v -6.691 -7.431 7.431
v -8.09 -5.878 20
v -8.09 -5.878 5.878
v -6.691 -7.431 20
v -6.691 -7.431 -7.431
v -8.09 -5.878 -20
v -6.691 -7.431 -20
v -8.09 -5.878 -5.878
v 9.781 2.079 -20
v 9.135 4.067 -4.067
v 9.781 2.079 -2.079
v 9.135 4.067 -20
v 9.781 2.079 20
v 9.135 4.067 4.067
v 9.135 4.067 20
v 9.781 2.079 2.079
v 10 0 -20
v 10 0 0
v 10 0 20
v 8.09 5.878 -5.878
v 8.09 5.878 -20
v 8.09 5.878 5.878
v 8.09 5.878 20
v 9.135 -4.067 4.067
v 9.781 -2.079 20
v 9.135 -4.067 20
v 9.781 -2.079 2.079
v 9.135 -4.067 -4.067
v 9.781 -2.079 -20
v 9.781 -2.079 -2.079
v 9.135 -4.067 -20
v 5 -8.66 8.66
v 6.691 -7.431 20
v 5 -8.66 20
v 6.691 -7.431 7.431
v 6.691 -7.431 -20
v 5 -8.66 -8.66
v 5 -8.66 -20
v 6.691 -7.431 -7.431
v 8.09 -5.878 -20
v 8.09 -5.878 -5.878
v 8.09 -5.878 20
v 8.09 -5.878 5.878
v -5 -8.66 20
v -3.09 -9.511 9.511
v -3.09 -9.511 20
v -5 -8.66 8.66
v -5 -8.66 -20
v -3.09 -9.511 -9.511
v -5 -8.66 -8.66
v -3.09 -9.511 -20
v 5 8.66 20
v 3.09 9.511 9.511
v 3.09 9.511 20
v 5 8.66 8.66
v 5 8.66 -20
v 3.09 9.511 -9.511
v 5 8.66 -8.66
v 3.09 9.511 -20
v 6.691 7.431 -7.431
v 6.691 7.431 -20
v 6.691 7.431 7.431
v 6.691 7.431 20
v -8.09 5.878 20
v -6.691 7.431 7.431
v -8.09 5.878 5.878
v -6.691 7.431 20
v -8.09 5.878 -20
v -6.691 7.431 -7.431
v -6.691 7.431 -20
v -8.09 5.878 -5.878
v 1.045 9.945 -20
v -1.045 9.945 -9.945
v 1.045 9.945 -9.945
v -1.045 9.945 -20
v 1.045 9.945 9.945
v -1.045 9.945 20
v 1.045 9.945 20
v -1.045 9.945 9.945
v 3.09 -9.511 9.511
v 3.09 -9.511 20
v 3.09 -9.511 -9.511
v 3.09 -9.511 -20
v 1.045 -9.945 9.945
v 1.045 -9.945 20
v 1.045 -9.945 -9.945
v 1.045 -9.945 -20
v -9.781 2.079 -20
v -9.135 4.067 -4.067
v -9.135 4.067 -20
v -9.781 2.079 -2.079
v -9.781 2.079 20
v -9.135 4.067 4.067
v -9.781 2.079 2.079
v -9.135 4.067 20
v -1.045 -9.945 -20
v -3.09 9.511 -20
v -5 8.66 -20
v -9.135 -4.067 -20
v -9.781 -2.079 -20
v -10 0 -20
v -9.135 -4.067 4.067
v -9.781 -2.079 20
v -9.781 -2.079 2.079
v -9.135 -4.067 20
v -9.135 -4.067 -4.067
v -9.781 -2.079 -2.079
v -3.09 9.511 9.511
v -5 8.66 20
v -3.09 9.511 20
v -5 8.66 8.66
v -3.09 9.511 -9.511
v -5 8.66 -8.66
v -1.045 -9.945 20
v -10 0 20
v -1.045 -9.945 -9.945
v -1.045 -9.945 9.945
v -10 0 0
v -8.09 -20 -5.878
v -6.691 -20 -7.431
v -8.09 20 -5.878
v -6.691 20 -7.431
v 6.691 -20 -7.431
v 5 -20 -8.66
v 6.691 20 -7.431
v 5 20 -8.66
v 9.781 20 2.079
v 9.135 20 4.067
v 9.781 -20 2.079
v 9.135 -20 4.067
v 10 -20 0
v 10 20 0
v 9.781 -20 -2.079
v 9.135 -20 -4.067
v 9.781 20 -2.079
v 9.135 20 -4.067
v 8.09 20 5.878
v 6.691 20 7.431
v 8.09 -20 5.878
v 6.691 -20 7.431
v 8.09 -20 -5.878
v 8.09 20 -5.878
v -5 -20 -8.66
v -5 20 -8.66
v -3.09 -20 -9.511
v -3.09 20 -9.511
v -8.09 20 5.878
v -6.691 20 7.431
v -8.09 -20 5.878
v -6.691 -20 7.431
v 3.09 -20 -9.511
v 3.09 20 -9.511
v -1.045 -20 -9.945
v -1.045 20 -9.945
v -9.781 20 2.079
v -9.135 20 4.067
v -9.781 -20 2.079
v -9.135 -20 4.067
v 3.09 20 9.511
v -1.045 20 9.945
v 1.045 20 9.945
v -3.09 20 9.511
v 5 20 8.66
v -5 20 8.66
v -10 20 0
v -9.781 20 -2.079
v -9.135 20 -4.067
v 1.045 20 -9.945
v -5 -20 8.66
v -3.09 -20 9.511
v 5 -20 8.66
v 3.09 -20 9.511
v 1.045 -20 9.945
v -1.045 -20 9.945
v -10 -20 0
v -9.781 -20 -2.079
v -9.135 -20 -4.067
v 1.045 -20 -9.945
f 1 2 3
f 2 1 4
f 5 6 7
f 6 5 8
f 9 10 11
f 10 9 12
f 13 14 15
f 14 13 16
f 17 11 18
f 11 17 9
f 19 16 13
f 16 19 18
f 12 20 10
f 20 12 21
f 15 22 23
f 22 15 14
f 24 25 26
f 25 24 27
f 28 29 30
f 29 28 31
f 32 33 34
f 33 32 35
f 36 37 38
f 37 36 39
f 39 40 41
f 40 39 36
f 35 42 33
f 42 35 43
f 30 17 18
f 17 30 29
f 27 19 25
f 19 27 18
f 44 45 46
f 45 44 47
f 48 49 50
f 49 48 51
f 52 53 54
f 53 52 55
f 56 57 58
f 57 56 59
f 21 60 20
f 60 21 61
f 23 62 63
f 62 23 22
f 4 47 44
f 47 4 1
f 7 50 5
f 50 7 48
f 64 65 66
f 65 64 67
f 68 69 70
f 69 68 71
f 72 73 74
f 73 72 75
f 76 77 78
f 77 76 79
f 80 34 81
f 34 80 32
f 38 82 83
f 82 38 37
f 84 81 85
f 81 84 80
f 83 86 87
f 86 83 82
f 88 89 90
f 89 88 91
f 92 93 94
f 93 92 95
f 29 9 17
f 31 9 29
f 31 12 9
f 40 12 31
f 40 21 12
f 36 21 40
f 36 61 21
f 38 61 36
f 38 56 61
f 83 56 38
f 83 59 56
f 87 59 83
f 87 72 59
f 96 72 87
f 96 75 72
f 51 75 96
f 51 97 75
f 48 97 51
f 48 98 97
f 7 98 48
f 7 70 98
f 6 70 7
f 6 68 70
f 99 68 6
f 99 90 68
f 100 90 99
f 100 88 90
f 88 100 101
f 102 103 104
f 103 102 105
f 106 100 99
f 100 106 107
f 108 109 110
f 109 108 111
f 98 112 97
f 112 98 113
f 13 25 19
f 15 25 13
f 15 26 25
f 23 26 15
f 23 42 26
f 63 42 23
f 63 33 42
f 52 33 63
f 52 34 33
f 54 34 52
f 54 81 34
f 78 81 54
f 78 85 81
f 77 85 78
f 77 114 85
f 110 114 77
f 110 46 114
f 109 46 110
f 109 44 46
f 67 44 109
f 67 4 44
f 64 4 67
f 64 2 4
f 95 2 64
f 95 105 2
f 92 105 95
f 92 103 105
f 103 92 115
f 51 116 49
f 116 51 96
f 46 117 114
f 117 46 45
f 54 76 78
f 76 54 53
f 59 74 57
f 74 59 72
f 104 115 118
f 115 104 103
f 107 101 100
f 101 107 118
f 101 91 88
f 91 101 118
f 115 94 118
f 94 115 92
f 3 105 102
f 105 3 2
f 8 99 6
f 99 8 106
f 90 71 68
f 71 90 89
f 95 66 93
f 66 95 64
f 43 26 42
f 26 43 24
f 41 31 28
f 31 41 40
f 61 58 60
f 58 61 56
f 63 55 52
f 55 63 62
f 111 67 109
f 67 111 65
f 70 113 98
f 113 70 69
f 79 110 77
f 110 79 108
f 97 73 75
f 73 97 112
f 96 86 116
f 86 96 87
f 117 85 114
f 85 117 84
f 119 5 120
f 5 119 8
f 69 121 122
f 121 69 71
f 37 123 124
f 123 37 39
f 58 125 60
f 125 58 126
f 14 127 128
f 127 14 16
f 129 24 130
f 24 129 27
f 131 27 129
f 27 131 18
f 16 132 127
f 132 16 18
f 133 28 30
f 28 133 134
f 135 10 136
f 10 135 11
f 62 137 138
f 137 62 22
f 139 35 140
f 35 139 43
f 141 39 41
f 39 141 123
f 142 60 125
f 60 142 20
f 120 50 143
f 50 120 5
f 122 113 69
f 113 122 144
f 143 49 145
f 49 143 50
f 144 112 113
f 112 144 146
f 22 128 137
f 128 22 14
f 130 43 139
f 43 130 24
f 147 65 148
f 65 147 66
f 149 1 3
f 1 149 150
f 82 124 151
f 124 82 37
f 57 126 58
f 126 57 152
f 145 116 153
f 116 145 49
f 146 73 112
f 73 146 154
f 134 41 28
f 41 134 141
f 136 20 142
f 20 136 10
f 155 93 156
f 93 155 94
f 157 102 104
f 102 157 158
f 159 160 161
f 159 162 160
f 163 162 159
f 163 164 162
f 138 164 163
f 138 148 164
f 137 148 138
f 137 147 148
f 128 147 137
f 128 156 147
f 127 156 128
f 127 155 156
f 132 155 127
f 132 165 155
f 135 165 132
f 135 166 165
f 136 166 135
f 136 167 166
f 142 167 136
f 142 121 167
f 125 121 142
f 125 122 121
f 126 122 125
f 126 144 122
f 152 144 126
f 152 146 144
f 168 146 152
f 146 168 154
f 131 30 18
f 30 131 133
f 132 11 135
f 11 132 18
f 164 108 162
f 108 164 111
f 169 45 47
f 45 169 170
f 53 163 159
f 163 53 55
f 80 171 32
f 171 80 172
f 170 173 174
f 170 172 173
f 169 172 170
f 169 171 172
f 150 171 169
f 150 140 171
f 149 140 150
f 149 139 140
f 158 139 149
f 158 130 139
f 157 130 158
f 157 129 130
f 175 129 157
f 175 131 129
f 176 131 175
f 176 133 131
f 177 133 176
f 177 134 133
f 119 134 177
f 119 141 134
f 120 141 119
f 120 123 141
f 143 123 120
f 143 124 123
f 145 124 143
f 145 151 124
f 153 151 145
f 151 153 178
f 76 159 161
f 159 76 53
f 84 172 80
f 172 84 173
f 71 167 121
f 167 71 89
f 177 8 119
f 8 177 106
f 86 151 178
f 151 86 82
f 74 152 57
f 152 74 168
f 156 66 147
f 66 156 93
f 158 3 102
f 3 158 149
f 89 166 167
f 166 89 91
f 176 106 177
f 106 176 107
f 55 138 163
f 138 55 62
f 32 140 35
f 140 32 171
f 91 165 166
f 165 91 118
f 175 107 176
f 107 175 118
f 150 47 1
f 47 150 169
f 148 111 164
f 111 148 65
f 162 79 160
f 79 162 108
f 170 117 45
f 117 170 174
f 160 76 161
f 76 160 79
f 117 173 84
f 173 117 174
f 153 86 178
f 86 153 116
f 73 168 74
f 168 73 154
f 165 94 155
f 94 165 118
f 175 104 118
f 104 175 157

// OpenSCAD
union() {
  cylinder(h = 40, r =10, center = true);
  rotate([90, 0, 0])
    cylinder (h = 40, r = 10, center = true);
}
